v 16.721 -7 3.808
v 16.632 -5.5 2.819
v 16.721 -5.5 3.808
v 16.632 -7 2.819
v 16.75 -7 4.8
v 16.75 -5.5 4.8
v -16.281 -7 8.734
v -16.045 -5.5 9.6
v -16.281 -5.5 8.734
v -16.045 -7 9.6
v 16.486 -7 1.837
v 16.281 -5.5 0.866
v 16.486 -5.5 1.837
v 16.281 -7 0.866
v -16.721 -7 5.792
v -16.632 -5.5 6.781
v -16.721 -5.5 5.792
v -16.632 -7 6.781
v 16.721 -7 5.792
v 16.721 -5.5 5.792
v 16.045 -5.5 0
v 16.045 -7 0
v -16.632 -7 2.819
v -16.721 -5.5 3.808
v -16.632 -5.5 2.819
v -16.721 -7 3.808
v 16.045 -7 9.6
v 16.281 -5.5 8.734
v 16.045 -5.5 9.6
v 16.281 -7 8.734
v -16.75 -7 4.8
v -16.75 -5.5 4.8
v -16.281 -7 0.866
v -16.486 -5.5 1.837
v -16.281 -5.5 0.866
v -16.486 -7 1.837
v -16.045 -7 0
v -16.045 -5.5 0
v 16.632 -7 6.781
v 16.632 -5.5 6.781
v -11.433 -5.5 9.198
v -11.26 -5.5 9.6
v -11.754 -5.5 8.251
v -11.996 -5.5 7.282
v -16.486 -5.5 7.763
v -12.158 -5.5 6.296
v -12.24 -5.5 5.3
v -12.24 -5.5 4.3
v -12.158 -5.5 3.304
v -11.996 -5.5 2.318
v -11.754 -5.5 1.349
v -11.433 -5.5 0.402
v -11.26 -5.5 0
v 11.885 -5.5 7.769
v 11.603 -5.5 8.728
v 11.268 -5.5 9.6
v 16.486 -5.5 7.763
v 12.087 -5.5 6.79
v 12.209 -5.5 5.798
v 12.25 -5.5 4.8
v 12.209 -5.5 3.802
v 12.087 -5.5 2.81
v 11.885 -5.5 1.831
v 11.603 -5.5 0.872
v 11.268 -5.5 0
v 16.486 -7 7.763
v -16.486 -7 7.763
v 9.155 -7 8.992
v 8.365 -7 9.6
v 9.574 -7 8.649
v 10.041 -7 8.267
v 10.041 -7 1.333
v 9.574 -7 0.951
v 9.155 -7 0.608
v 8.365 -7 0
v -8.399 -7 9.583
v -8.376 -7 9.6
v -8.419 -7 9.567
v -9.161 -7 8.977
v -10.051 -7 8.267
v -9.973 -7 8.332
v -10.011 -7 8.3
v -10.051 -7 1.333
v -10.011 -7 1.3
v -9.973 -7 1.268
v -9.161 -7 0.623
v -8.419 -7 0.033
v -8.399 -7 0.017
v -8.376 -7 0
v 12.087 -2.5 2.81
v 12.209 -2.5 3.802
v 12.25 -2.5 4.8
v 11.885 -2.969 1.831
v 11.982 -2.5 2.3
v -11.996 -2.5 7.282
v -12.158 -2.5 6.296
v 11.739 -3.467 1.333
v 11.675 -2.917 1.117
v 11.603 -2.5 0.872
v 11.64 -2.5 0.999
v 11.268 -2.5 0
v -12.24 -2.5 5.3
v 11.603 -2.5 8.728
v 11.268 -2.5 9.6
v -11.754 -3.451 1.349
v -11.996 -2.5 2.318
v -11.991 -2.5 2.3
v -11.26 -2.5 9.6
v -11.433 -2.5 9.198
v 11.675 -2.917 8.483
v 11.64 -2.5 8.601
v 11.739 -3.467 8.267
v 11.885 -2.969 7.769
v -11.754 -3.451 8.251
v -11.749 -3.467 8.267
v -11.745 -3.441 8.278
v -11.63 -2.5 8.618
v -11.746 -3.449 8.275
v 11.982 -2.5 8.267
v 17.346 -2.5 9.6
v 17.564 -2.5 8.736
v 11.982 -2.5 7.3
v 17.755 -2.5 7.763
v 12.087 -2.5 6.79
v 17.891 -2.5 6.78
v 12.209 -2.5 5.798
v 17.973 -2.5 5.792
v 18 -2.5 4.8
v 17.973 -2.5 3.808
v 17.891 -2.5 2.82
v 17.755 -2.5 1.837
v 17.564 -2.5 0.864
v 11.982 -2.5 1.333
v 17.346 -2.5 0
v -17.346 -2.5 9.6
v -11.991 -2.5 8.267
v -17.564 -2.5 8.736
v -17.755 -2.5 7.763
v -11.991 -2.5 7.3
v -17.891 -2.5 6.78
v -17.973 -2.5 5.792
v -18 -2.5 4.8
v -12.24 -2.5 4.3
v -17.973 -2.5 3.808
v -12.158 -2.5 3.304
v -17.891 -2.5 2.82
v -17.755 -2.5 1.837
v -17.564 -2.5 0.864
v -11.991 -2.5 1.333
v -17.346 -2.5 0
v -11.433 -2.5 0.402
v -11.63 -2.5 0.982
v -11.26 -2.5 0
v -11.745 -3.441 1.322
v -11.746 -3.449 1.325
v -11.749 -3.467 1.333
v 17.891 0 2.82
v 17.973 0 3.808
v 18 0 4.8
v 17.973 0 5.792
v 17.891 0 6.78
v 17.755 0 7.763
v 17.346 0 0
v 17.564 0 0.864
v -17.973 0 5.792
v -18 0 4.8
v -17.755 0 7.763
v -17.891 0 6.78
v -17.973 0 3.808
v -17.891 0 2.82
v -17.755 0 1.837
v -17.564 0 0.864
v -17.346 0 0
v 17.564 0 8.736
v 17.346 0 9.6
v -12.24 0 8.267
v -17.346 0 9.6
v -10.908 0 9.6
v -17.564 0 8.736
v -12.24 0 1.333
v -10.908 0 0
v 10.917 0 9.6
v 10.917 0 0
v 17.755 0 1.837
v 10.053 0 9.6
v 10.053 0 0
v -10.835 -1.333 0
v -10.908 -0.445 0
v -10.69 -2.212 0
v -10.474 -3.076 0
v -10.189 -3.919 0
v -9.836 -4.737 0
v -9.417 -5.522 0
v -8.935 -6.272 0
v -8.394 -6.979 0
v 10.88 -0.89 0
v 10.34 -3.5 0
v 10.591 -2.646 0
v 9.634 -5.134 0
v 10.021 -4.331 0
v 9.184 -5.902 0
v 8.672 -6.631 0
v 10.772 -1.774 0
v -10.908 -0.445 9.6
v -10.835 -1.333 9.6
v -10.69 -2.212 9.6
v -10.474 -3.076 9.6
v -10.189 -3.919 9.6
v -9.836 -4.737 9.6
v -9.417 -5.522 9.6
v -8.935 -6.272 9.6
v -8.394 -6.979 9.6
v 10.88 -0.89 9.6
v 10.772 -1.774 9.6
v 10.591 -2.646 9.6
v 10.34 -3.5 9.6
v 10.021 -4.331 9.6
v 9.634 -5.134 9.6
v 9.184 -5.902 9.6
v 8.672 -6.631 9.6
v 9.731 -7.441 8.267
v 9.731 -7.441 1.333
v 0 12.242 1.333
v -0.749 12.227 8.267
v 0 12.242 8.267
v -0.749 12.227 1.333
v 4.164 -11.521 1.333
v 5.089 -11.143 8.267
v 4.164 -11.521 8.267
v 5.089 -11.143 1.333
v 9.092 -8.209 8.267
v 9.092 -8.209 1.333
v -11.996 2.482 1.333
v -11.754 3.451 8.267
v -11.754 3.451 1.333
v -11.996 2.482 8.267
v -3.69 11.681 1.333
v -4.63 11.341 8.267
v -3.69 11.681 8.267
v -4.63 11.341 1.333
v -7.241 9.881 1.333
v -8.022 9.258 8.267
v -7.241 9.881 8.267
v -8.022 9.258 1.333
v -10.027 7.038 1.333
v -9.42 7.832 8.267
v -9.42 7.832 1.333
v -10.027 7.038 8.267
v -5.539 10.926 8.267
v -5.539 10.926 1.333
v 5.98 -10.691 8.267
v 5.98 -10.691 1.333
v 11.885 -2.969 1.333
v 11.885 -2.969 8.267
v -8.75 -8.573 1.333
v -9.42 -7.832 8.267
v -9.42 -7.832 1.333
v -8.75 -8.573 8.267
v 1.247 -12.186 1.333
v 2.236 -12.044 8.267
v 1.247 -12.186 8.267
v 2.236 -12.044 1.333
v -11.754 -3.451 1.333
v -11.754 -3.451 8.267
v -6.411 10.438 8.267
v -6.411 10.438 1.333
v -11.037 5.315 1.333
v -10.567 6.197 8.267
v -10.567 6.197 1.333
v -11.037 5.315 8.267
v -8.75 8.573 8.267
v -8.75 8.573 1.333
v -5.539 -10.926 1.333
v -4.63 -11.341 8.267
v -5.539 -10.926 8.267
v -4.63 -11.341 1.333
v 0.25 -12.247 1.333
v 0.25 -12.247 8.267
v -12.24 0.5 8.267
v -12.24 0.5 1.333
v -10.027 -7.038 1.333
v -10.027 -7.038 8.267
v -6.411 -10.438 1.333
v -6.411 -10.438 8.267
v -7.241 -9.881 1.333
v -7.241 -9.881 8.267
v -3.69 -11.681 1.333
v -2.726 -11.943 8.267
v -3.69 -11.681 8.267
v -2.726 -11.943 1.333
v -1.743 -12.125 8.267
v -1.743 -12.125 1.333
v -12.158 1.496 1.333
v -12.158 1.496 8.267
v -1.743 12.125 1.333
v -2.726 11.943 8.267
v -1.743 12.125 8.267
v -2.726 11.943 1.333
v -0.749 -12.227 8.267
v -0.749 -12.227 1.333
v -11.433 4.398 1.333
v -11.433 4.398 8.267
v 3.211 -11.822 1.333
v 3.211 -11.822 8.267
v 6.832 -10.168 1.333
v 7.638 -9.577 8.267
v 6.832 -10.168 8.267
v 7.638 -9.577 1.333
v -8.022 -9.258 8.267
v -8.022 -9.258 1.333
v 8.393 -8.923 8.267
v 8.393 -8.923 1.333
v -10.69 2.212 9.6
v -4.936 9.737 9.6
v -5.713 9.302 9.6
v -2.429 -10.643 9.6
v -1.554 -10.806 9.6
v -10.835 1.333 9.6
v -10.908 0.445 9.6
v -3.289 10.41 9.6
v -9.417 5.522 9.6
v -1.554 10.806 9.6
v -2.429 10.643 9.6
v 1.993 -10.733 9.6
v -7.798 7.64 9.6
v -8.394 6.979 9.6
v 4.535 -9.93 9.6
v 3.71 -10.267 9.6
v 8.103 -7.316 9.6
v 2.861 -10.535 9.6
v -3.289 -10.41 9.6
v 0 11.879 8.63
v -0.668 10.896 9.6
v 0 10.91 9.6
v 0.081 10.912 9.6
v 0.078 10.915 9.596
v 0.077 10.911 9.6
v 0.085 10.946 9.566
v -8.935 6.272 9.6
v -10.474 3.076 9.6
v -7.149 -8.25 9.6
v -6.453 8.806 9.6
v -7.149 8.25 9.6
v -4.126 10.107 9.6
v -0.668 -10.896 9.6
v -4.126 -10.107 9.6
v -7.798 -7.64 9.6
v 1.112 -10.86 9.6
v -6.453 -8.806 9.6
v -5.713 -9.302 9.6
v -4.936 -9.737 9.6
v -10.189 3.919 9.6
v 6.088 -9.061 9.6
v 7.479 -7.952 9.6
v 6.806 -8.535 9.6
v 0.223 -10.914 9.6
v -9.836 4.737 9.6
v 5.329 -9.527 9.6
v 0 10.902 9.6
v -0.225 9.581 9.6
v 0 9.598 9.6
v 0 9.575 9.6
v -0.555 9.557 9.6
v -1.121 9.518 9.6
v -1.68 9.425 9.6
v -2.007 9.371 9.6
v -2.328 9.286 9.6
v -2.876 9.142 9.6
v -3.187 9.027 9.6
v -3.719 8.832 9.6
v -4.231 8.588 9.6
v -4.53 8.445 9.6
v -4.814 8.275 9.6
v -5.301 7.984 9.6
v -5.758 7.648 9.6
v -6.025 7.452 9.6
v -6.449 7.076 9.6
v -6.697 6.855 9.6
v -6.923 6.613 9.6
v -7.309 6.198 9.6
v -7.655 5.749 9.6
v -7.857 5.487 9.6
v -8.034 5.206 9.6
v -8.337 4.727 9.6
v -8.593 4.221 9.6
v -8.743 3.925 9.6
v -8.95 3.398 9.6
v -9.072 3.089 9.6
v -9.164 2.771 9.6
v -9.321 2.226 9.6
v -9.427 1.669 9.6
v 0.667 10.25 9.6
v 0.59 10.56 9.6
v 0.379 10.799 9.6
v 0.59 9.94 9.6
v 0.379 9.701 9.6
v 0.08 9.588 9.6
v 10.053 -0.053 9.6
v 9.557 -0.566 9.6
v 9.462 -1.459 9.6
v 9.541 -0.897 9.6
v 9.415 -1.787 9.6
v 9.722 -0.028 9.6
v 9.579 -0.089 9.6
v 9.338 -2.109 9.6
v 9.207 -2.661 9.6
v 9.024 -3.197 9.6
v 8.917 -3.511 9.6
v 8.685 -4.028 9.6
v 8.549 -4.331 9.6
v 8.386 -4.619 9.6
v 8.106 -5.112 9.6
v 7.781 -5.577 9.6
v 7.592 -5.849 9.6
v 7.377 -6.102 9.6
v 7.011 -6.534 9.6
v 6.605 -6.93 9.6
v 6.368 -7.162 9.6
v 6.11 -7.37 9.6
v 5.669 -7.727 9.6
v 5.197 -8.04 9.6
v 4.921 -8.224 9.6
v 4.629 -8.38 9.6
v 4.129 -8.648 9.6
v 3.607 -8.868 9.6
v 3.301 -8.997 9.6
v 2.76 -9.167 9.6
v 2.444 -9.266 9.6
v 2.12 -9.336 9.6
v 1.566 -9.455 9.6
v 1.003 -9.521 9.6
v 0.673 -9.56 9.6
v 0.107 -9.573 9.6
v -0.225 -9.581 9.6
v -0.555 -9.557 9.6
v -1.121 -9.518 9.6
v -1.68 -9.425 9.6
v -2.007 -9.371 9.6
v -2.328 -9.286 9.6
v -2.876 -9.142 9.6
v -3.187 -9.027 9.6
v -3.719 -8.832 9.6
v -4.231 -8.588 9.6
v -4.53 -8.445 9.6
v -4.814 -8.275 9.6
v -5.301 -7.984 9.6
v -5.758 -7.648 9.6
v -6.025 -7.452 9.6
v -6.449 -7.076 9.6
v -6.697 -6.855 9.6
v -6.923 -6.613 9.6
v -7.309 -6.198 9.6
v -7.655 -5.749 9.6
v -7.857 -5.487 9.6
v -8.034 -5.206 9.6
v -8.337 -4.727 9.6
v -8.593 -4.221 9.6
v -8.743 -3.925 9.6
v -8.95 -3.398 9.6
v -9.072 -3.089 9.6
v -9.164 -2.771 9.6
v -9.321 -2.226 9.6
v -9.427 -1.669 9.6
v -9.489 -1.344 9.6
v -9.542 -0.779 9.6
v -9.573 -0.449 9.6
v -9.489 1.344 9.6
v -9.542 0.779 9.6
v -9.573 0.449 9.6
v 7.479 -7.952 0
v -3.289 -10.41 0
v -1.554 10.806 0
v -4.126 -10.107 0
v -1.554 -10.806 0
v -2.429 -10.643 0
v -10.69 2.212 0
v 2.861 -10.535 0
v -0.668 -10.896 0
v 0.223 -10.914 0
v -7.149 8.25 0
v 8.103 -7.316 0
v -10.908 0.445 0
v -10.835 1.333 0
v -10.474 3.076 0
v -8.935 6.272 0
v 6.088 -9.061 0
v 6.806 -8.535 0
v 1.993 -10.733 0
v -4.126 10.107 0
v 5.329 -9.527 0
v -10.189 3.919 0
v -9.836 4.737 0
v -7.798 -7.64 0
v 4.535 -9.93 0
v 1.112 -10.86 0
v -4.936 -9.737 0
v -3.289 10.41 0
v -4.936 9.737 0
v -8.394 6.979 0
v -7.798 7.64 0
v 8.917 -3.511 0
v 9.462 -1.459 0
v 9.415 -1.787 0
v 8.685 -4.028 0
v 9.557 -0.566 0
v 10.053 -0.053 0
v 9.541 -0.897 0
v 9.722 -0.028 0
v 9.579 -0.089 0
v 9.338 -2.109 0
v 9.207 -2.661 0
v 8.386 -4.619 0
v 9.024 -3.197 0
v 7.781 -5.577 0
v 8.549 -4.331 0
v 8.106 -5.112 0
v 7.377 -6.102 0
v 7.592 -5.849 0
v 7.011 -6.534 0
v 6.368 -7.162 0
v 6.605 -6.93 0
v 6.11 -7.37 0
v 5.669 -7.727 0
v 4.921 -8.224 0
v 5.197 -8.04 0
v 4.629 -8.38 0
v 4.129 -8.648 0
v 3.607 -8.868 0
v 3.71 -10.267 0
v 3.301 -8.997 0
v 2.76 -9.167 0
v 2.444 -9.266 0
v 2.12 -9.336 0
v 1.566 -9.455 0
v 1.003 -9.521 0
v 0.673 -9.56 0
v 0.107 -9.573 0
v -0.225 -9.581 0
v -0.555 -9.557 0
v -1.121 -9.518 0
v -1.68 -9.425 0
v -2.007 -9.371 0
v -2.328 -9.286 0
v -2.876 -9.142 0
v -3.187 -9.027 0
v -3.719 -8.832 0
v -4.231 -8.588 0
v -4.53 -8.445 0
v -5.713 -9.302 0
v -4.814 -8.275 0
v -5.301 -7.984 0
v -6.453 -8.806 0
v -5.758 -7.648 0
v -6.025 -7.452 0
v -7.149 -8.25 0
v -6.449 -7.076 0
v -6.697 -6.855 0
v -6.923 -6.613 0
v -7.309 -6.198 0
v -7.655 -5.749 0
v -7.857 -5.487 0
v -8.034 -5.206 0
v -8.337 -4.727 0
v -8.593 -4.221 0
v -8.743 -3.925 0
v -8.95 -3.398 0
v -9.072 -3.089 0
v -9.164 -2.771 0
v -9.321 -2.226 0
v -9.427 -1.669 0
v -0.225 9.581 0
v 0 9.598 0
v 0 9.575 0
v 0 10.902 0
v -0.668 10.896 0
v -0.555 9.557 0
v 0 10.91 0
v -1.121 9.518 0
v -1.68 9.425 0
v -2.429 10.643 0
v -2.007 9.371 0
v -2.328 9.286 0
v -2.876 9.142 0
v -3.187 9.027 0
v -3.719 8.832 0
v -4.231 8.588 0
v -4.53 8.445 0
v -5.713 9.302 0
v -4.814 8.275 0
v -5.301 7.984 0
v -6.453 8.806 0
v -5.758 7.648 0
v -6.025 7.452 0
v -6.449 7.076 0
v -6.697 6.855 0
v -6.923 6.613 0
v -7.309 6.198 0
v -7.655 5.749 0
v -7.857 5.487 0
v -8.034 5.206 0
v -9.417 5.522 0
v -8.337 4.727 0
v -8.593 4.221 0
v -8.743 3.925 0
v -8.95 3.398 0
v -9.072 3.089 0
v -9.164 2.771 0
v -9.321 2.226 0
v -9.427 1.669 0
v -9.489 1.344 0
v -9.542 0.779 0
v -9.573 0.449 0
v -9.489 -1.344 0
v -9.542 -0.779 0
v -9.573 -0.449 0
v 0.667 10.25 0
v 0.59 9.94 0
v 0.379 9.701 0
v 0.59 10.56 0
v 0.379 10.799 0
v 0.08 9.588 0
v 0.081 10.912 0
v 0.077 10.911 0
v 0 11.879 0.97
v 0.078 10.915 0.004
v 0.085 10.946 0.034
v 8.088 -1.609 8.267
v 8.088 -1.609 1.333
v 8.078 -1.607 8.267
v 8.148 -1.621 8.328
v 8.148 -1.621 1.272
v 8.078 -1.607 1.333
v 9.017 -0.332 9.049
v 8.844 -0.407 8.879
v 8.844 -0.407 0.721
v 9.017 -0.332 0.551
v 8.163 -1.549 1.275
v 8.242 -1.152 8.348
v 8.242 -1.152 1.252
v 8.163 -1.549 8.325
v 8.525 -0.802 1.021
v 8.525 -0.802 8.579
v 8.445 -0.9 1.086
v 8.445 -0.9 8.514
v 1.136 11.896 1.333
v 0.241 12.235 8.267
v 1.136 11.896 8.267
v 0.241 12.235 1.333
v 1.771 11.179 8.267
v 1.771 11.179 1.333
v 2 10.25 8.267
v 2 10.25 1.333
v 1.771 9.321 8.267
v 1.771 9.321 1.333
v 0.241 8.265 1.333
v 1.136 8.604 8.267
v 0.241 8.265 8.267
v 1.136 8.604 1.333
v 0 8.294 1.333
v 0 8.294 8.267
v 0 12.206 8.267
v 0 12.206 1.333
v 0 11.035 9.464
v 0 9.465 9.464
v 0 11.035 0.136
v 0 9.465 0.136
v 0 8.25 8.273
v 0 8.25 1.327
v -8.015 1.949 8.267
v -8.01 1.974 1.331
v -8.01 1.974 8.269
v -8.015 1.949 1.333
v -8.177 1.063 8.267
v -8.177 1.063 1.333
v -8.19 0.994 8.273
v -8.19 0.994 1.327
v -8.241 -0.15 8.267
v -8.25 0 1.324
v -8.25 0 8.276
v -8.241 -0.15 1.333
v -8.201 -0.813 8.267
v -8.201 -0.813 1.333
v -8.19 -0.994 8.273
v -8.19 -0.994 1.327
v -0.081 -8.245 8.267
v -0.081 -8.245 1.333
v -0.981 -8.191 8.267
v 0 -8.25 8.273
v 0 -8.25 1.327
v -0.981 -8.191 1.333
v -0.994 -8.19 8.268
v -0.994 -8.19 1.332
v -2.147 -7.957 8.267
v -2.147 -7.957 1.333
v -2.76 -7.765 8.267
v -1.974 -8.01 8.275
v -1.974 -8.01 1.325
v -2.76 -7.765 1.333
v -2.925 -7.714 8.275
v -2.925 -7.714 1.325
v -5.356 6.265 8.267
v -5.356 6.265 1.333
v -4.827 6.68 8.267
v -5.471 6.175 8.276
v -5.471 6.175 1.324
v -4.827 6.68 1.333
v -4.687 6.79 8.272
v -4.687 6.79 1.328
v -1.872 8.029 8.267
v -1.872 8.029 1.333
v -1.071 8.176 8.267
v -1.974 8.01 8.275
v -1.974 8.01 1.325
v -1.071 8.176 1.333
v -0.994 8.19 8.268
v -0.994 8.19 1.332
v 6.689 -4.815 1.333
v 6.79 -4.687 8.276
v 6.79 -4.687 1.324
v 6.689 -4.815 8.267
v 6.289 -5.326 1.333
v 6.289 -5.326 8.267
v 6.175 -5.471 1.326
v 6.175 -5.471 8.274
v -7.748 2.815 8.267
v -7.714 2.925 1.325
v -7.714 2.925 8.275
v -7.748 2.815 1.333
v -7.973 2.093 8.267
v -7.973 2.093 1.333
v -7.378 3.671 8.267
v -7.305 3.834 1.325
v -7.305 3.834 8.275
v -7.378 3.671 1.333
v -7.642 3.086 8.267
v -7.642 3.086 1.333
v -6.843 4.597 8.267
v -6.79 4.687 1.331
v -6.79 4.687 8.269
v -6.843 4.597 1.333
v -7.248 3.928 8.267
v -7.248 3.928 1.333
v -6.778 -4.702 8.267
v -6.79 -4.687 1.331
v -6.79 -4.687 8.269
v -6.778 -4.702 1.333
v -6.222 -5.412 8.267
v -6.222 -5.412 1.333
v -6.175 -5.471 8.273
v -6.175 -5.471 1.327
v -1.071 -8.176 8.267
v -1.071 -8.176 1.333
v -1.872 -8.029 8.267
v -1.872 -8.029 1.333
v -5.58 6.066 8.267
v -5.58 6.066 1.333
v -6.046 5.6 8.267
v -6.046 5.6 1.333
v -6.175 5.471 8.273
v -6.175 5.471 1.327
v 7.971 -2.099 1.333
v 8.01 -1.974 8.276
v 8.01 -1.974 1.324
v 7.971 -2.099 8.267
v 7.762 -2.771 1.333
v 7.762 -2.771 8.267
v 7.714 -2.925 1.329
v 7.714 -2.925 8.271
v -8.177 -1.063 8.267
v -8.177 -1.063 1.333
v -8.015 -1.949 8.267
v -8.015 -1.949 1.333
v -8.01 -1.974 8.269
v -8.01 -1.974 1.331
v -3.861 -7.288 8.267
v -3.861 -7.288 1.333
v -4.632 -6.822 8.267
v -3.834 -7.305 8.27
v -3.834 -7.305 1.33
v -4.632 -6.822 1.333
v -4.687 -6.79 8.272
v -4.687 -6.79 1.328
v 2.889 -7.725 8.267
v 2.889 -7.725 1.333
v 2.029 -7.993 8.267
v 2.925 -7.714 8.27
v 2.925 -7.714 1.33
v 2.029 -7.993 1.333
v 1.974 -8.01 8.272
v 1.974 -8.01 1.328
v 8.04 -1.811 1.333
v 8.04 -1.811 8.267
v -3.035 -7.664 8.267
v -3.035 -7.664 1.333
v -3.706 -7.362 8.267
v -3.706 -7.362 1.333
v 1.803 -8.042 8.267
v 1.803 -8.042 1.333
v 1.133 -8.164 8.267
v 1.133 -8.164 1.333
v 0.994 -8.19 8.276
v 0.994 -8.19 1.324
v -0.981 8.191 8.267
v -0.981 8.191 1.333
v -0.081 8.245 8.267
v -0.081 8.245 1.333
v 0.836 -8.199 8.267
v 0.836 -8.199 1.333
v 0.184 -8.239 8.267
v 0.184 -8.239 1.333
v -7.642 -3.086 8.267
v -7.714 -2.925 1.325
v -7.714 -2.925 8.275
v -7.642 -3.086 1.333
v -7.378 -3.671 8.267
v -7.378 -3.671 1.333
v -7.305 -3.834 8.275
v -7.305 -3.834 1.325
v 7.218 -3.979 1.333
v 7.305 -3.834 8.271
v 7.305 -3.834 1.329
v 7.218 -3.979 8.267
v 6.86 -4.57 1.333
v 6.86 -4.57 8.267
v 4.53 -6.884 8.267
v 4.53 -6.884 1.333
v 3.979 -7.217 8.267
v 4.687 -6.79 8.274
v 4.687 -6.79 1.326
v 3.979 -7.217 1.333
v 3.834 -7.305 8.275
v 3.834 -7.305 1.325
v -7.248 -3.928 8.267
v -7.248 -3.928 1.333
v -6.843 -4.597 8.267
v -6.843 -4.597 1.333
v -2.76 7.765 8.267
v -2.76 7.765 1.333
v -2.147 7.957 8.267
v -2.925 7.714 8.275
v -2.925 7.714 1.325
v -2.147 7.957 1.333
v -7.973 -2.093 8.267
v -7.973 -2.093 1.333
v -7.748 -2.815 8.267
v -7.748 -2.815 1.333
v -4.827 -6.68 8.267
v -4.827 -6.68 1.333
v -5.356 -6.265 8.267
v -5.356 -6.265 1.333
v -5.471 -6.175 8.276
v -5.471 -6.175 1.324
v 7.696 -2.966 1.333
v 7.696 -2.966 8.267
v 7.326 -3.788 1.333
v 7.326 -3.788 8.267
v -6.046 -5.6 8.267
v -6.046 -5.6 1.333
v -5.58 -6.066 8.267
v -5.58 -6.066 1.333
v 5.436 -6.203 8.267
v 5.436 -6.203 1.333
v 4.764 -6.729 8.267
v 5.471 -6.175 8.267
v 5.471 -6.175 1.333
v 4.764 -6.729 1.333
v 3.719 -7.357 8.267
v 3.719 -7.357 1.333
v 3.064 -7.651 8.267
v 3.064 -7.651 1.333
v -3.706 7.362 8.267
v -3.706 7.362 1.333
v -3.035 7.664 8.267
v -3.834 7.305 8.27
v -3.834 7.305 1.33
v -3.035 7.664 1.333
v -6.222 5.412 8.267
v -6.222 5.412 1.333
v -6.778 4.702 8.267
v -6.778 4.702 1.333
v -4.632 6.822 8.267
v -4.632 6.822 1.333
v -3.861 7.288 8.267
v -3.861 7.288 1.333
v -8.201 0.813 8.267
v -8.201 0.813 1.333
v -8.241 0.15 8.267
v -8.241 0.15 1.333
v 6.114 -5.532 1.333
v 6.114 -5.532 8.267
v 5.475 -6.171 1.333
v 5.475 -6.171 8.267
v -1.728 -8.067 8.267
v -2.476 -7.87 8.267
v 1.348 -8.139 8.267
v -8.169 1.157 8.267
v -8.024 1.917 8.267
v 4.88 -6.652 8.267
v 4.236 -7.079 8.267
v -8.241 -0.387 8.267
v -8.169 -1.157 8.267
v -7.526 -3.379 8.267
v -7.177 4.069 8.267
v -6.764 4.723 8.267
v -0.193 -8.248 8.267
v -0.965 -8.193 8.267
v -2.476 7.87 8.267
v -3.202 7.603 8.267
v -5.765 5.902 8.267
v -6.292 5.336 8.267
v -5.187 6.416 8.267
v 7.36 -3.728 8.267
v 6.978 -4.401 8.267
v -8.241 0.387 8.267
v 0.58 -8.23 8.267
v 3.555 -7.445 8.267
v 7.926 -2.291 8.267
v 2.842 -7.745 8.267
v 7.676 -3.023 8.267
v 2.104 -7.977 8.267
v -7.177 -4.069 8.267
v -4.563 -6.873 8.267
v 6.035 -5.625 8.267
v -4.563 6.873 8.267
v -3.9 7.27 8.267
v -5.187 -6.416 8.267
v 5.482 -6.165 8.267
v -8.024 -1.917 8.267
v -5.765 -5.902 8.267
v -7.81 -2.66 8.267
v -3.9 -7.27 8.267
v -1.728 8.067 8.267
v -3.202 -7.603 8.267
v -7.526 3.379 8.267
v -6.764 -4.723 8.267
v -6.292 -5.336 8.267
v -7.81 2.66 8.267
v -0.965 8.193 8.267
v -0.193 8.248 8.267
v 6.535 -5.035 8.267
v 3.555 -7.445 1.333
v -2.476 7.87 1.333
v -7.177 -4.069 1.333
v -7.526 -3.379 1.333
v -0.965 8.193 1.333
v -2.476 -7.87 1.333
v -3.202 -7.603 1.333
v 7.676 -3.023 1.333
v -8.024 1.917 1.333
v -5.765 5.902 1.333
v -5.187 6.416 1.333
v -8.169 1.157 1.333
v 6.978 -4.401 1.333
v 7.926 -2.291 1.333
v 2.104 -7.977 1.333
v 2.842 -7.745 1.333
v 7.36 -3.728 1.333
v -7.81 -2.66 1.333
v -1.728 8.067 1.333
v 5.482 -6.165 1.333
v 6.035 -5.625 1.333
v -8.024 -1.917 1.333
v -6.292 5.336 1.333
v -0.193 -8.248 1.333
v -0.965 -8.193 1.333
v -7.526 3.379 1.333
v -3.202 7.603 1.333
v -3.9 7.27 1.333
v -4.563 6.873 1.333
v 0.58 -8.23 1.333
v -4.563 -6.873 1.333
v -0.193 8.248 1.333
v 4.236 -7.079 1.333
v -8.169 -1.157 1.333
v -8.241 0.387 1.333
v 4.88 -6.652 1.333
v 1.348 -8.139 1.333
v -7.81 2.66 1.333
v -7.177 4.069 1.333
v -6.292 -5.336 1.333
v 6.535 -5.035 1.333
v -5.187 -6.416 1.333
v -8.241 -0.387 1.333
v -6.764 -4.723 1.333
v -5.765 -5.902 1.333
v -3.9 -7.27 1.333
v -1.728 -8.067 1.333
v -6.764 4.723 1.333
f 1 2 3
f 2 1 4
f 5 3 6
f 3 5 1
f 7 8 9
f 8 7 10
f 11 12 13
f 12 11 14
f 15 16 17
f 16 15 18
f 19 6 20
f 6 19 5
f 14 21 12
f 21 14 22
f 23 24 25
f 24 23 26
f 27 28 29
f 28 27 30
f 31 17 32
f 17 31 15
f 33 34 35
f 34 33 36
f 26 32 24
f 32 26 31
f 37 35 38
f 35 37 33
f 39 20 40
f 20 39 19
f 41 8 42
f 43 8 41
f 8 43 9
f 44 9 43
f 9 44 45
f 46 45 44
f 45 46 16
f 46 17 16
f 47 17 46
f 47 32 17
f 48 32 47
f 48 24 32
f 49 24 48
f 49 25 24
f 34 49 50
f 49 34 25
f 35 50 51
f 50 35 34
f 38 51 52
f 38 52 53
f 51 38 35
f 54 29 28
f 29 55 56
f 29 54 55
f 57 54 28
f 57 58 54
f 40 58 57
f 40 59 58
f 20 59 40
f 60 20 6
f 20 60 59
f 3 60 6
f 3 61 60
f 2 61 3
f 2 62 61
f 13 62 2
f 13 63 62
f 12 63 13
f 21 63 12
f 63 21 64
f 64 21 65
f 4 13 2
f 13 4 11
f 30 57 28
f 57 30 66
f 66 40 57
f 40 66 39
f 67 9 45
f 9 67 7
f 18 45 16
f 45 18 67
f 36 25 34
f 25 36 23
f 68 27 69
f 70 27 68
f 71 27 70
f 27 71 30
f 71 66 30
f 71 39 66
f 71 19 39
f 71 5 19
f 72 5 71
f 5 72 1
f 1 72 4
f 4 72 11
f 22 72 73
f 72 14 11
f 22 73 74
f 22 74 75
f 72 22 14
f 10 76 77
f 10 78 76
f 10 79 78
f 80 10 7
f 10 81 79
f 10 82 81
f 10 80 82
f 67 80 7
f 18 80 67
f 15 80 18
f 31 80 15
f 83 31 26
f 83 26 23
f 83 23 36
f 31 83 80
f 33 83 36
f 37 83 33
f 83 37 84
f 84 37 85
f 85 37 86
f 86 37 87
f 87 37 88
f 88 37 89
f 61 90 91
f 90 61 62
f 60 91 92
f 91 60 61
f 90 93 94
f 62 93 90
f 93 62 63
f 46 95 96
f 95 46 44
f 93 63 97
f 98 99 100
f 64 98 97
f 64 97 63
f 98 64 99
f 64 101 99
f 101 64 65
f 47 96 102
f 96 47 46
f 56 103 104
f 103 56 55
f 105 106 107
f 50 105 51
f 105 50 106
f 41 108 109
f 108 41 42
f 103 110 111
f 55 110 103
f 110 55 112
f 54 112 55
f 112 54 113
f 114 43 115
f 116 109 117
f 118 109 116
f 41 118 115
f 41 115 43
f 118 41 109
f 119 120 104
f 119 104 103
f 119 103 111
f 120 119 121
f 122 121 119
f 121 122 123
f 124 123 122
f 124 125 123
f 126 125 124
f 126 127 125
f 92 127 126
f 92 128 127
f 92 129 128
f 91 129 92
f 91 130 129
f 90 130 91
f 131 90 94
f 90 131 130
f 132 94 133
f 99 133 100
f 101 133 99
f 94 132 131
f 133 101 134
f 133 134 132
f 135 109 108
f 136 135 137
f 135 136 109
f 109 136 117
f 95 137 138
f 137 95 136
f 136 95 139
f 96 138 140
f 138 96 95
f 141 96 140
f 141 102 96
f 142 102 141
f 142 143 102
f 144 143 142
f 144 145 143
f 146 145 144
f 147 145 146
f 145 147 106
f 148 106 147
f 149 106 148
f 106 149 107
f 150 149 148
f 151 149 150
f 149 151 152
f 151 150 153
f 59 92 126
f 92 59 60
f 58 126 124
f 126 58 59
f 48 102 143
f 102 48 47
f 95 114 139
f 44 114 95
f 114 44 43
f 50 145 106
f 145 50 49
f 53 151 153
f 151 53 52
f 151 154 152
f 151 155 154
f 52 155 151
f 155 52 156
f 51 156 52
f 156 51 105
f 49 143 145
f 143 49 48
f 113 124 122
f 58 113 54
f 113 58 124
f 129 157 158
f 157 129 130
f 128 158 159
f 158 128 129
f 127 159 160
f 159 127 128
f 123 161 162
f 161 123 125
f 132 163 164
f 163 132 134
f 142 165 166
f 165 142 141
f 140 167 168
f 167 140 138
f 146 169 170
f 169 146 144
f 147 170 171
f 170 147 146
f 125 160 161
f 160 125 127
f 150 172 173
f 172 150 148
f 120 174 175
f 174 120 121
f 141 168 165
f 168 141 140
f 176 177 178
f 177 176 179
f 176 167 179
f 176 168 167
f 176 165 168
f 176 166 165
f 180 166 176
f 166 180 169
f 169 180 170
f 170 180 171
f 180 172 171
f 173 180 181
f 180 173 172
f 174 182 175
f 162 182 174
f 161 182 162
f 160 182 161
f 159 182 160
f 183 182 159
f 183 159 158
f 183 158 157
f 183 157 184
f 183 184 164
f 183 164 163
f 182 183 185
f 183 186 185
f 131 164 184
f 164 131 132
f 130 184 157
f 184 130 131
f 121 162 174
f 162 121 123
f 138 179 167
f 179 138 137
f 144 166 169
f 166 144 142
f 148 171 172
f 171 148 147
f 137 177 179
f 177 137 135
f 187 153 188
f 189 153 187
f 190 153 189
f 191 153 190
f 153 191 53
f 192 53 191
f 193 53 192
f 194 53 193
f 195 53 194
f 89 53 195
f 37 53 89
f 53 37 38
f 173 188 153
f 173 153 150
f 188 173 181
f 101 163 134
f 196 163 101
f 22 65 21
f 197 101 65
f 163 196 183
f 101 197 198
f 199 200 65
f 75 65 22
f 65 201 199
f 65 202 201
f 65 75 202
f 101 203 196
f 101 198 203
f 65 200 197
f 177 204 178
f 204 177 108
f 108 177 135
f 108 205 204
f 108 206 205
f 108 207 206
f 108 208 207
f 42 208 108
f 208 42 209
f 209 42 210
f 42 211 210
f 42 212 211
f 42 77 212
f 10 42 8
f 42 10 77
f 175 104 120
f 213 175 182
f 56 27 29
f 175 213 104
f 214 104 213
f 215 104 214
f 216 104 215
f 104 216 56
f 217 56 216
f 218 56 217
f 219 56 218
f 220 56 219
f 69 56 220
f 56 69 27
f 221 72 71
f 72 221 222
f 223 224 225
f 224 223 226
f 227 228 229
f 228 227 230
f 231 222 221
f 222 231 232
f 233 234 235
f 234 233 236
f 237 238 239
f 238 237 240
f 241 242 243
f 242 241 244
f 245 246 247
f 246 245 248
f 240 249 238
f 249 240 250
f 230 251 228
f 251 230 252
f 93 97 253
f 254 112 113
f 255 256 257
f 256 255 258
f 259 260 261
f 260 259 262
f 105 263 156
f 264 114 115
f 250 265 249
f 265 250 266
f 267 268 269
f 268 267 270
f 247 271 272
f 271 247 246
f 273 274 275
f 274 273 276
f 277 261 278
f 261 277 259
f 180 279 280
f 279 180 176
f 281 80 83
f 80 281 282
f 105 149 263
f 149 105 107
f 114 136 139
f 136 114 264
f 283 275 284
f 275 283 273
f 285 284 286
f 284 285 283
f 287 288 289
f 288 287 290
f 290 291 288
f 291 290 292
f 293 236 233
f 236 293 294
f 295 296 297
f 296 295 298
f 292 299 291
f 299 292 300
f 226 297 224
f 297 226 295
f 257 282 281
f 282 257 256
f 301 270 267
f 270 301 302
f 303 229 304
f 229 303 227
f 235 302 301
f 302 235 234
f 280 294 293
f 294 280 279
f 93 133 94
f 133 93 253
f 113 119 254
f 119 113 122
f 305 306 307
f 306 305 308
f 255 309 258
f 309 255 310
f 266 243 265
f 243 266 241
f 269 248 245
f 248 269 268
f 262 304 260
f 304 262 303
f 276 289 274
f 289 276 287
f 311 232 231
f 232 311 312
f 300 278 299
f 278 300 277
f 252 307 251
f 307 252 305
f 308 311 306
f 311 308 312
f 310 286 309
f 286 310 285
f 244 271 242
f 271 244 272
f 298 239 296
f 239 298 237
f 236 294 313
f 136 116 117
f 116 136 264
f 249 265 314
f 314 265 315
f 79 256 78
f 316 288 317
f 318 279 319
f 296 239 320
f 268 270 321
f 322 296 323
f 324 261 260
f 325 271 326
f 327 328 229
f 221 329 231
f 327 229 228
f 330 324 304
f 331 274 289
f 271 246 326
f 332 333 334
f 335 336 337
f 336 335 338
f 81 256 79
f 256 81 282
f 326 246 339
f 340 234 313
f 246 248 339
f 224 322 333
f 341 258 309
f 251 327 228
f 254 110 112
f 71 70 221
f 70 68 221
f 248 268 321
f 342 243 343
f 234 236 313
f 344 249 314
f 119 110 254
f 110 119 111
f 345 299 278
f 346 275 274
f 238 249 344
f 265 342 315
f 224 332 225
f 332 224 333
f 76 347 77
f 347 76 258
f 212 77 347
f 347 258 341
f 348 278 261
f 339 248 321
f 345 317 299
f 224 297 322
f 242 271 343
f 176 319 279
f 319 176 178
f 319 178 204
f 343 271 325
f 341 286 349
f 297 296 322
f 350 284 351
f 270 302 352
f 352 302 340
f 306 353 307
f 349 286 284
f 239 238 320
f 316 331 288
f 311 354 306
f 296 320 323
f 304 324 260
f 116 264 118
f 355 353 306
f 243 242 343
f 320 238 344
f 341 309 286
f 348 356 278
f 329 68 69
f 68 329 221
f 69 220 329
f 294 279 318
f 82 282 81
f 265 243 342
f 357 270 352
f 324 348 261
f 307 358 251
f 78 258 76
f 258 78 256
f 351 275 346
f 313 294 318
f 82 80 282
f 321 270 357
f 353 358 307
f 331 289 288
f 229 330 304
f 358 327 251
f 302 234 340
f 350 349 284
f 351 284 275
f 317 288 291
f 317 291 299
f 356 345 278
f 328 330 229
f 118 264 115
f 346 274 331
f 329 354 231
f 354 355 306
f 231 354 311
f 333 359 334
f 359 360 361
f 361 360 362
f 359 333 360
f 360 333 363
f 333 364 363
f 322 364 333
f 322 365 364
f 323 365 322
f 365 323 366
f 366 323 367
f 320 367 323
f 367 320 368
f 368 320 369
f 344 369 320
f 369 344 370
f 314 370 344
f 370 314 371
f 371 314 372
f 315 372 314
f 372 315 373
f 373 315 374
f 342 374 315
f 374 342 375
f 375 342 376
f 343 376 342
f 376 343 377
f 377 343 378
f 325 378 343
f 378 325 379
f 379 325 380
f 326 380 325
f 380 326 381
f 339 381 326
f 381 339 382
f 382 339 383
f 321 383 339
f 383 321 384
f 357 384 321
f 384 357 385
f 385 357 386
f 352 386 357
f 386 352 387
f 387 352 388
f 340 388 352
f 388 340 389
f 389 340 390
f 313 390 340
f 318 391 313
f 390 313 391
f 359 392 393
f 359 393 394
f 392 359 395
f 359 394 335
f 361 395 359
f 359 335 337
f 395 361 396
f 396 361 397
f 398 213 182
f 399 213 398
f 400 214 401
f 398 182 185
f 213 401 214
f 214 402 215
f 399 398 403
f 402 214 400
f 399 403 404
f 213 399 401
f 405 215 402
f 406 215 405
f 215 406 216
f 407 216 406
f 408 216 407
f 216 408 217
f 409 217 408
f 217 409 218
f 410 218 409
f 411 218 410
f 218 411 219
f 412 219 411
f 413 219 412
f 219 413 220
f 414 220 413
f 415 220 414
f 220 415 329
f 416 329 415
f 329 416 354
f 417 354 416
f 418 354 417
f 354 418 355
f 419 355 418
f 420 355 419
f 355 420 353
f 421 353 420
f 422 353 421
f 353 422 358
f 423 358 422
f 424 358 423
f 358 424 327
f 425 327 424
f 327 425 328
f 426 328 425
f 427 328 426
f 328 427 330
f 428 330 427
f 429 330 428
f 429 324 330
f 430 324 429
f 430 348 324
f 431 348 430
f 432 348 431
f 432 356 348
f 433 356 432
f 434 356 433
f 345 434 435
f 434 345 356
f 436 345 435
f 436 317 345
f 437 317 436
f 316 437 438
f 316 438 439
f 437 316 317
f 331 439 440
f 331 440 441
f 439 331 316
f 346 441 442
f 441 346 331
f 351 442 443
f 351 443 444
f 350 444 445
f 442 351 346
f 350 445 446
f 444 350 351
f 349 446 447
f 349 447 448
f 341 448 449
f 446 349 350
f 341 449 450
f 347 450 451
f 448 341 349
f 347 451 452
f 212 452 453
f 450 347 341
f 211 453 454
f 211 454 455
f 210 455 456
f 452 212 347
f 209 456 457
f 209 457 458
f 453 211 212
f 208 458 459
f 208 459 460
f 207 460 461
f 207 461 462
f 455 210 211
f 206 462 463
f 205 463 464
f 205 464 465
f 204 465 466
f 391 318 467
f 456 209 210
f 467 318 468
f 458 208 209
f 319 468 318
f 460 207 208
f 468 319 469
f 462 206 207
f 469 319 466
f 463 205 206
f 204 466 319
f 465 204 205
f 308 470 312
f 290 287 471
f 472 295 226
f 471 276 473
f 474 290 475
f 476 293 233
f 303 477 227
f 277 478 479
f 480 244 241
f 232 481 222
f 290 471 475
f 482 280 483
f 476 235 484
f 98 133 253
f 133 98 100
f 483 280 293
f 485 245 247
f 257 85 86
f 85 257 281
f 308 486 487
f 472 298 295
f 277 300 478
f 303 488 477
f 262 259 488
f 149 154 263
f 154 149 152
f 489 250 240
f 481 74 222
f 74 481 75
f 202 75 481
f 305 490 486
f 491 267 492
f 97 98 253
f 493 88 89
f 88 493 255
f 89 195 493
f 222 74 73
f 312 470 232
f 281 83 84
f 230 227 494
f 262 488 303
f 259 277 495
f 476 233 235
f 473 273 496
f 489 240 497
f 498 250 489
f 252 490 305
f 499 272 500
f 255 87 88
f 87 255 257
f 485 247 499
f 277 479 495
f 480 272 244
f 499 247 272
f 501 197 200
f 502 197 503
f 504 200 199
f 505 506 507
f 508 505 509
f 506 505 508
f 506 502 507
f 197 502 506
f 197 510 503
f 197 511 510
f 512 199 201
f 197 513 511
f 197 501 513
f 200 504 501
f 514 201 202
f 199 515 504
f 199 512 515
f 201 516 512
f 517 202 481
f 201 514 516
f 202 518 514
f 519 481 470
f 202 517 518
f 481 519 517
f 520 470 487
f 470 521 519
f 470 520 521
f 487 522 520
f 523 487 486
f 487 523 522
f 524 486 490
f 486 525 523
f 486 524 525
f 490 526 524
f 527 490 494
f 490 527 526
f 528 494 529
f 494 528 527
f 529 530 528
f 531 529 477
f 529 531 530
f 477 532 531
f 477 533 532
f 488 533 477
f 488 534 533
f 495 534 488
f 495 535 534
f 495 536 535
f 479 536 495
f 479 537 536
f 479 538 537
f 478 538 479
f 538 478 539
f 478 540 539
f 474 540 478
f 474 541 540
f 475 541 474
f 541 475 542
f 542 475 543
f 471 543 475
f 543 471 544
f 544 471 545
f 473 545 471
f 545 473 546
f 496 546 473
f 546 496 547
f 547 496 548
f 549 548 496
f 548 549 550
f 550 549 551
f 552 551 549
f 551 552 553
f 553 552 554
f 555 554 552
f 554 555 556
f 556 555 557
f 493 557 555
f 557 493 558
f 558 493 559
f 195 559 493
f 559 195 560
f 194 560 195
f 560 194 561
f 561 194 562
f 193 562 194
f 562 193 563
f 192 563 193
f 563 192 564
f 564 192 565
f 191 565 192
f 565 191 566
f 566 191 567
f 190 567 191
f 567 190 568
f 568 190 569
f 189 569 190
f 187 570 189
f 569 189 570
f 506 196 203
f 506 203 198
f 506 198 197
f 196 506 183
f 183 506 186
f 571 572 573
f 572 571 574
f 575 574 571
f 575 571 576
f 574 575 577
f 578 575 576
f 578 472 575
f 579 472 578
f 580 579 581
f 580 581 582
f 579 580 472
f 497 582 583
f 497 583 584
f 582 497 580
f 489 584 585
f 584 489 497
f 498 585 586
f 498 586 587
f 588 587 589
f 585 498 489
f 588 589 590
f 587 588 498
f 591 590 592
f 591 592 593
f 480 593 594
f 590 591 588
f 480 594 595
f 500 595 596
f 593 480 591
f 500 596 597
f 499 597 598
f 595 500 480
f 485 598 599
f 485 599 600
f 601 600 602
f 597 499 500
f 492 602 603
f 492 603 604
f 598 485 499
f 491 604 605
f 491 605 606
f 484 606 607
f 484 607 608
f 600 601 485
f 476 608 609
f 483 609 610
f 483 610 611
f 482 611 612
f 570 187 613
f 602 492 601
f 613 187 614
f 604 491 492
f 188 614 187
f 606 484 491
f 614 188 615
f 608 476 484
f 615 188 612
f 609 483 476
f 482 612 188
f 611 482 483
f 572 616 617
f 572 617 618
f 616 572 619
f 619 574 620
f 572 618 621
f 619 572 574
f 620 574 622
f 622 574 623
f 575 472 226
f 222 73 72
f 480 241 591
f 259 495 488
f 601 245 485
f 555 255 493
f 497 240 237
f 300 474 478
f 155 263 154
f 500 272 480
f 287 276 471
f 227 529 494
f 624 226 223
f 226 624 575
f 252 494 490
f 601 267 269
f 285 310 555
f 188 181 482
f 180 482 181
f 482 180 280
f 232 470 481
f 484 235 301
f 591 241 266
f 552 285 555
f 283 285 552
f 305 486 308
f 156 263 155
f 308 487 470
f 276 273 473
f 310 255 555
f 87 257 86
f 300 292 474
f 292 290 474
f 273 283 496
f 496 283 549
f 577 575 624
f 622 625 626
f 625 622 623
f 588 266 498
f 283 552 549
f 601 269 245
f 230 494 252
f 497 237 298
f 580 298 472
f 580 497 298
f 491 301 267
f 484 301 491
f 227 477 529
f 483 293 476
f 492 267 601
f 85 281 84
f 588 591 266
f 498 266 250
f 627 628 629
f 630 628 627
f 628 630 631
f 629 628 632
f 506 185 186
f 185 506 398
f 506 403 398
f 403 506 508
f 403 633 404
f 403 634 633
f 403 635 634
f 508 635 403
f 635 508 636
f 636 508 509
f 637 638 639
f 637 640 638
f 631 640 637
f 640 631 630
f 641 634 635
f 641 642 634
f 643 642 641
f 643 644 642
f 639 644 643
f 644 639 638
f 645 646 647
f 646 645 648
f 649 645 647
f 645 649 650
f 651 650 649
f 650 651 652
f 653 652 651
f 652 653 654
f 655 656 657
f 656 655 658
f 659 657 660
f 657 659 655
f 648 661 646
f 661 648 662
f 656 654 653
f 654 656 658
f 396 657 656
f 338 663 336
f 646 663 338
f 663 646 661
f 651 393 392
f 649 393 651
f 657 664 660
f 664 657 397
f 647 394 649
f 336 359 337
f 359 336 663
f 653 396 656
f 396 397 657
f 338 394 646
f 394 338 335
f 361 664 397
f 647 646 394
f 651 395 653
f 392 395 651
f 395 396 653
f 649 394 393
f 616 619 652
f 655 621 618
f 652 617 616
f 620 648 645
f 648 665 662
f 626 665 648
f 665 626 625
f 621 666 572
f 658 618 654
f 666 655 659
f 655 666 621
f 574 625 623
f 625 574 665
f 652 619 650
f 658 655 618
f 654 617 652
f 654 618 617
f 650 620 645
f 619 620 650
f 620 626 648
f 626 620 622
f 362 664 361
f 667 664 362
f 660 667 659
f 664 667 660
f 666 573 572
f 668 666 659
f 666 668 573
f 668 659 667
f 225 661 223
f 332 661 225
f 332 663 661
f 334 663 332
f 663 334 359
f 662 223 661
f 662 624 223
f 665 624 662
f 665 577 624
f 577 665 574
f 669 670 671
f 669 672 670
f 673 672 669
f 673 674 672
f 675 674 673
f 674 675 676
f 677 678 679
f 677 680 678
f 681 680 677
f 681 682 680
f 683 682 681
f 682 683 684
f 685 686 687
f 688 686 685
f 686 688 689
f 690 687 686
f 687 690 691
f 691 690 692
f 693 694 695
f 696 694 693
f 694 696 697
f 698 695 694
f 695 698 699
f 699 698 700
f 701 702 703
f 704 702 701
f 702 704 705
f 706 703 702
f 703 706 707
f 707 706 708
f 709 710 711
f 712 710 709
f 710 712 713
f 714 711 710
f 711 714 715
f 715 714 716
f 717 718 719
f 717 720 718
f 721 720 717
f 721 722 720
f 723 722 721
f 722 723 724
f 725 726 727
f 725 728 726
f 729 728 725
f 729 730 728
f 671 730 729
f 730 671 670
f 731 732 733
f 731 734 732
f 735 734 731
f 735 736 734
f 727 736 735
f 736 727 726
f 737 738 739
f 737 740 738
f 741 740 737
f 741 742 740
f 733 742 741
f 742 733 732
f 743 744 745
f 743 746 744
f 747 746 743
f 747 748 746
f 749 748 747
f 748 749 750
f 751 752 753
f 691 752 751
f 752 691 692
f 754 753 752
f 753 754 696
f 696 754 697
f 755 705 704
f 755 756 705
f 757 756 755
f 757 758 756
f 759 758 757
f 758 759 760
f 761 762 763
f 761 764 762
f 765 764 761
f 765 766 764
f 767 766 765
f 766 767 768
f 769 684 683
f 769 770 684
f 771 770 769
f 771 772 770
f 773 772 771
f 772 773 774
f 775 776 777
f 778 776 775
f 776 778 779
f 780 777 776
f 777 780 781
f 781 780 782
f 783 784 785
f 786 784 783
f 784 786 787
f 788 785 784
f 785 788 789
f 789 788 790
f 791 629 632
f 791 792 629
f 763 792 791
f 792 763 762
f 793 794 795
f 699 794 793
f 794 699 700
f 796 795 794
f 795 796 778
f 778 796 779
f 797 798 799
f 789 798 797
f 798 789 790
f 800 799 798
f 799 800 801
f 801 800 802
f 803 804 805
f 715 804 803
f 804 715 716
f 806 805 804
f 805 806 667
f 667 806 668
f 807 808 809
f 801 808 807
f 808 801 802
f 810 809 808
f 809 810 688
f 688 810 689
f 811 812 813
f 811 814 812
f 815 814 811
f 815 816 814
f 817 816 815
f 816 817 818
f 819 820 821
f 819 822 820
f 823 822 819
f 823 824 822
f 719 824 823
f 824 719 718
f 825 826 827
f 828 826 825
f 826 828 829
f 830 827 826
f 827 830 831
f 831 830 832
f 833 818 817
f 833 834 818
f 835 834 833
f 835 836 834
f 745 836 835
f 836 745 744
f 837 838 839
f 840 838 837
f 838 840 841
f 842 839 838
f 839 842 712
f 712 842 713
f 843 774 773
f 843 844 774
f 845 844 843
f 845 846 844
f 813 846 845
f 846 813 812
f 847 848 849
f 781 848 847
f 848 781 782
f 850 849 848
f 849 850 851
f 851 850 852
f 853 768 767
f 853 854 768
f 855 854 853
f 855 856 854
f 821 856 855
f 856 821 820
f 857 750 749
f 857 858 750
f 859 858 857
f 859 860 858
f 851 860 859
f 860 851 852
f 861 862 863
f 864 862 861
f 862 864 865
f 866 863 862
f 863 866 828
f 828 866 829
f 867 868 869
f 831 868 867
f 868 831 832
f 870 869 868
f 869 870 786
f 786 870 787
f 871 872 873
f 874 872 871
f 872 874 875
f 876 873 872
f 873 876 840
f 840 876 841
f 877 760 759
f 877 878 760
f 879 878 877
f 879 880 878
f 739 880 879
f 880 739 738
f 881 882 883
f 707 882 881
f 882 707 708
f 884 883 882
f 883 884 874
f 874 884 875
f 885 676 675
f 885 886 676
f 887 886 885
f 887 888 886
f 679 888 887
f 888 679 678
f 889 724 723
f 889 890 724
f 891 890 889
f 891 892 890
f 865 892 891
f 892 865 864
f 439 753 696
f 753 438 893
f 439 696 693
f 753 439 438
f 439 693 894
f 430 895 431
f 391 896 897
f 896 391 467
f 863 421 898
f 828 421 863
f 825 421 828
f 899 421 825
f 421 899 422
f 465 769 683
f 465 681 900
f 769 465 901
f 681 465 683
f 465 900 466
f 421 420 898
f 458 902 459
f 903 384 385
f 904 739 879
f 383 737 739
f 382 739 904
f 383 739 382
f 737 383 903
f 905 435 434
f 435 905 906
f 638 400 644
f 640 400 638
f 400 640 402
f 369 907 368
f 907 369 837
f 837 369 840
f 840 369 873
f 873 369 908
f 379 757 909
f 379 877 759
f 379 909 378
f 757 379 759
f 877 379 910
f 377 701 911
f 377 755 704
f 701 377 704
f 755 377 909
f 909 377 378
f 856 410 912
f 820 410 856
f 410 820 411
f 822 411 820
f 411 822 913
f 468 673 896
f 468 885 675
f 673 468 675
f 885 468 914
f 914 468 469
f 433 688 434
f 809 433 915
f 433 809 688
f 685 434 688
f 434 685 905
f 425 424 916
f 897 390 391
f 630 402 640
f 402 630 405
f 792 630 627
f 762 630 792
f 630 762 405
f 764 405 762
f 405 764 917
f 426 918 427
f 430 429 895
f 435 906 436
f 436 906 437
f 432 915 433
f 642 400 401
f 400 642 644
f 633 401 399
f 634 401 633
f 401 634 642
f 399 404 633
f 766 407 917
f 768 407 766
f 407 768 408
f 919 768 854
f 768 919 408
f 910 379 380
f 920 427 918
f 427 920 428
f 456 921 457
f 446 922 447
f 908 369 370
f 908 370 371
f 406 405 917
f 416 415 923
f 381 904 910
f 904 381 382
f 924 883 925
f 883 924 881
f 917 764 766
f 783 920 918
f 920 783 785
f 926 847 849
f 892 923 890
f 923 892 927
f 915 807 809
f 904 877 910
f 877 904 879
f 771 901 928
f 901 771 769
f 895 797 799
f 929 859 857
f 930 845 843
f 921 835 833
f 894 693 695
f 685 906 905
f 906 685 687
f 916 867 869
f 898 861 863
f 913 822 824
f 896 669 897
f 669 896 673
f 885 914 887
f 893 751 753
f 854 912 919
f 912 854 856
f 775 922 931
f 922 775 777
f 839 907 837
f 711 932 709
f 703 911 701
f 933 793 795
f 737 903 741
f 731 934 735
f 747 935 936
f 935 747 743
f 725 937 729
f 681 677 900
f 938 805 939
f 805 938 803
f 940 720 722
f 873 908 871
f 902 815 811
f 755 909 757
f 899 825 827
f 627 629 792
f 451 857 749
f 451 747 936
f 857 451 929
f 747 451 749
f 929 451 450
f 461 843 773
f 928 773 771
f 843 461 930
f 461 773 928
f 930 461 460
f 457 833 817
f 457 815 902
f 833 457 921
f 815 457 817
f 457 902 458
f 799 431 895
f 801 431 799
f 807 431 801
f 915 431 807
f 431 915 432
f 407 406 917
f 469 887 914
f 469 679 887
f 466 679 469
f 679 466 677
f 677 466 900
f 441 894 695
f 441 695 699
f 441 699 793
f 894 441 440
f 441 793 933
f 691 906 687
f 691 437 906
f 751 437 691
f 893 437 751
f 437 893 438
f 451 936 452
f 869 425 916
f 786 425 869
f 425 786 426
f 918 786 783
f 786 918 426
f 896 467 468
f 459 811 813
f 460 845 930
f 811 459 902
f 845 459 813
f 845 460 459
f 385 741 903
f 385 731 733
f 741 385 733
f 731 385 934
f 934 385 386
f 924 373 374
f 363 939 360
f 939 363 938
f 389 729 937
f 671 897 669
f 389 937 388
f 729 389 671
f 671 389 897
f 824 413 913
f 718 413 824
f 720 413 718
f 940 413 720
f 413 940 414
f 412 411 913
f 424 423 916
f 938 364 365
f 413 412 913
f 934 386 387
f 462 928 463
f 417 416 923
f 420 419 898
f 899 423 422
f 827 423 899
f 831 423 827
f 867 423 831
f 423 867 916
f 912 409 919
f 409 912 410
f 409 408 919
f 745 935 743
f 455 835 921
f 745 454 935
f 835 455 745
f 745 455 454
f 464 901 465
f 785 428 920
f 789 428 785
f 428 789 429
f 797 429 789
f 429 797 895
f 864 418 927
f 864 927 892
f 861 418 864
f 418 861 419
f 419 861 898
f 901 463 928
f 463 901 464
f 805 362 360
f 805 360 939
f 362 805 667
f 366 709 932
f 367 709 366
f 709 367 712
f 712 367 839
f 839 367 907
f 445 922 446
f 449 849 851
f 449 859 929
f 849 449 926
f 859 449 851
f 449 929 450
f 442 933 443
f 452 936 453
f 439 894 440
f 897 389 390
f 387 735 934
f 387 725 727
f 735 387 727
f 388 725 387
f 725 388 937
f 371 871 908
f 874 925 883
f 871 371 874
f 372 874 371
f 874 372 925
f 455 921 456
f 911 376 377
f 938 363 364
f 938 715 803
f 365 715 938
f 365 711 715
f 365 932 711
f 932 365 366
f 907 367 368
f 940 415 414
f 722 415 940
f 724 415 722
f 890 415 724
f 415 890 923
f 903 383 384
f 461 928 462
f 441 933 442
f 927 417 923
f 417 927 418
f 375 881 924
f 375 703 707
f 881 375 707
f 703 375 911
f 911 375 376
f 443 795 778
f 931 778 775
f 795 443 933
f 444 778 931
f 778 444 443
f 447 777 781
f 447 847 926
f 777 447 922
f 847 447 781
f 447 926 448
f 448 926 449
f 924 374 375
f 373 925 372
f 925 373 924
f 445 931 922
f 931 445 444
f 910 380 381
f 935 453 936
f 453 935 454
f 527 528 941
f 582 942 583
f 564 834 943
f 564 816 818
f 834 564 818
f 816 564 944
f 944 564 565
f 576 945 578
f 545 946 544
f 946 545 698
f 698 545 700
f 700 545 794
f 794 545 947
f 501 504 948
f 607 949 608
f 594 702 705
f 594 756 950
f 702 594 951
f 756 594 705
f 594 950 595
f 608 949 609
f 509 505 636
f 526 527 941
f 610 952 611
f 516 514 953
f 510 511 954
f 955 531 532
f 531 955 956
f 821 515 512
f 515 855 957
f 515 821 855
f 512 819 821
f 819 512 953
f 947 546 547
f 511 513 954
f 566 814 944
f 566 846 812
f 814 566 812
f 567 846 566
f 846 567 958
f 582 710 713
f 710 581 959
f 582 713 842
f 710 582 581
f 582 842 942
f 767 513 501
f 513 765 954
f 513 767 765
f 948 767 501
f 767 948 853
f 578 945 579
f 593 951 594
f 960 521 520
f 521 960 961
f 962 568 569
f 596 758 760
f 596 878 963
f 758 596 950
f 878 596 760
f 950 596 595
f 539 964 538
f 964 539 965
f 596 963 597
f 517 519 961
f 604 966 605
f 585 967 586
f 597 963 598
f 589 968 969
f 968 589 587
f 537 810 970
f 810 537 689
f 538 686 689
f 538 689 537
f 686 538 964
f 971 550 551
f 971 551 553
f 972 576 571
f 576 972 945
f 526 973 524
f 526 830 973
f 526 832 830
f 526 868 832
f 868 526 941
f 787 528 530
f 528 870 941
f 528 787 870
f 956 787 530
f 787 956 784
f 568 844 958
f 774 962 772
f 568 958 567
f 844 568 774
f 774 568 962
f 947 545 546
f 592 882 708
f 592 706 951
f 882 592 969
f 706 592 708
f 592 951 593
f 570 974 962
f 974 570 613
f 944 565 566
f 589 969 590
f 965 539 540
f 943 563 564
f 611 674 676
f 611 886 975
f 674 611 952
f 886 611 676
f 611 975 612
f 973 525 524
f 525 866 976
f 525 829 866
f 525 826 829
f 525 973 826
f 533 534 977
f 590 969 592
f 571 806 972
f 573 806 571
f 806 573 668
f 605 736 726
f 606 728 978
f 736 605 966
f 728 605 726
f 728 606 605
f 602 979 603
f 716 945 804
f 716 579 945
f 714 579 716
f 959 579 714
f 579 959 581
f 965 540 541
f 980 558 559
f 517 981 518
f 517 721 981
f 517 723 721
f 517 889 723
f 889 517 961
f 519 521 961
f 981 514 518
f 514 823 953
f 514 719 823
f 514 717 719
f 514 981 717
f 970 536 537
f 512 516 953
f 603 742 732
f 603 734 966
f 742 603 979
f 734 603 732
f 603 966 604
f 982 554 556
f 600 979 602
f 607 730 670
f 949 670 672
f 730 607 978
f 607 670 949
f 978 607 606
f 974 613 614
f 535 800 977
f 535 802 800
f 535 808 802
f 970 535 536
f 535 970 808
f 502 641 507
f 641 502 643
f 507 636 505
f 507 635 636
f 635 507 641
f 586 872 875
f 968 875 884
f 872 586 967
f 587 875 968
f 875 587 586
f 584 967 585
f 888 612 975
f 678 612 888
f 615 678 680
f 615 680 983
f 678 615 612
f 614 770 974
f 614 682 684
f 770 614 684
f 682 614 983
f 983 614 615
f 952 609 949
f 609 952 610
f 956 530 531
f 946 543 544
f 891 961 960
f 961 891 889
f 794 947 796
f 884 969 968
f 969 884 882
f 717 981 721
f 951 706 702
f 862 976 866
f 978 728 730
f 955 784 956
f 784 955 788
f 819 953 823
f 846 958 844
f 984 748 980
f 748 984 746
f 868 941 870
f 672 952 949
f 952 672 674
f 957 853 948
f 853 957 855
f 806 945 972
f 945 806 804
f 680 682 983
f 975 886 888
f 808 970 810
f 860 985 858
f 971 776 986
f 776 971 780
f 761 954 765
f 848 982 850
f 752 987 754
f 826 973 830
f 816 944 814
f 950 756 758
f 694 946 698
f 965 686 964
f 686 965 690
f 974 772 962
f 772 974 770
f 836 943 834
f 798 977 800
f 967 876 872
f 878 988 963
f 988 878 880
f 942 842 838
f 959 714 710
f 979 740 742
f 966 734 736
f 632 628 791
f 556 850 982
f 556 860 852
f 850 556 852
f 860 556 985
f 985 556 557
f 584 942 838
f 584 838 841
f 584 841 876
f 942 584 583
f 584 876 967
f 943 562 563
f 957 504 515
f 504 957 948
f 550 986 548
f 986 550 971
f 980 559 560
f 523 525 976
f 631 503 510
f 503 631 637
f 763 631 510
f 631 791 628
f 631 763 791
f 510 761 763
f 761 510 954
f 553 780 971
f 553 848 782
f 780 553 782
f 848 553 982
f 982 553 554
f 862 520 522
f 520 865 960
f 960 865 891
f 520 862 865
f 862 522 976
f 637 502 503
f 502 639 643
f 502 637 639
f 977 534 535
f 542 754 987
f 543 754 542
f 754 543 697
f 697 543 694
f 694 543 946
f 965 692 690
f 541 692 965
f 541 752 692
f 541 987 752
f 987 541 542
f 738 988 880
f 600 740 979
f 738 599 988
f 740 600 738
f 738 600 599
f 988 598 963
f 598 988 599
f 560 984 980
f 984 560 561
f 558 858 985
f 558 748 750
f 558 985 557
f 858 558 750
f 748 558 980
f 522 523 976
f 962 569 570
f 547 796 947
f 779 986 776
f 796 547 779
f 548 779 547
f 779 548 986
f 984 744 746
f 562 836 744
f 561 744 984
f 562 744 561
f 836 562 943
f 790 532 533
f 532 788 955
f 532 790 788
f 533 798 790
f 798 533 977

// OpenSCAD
Tab_Thickness = 1.5; // 0.01
Tab_Width = 9.6; // 0.01
Tab_Outer_Diameter = 33.5; // 0.01
Socket_Inner_Diameter = 24.5; // 0.01
Socket_Inner_Radius = Socket_Inner_Diameter / 2;
Socket_Inner_Depth = 3.0; // 0.01
Flange_Thickness = 2.5; // 0.01
Flange_Outer_Diameter = 36.0; // 0.01
Flange_Inner_Diameter = 19.5; // 0.01
Hook_Thickness = 4.0; // 0.01
Hook_Chamfer = Hook_Thickness/3;
Total_Height = Tab_Thickness+Socket_Inner_Depth+Flange_Thickness;
Part = "Hook"; // [Tabs, Hook, Pin]

$fa = $preview ? 15 : 2;
$fs = $preview ? 1.25 : 1;

if (Part == "Tabs") {
	tab_socket();
}
if (Part == "Hook") {
	difference() {
		union() {
			tab_socket();
			hook_positive();
		}
		hook_negative();
	}
}
if (Part == "Pin") {
}

module body() {
	// Tabs
	cylinder(d=Tab_Outer_Diameter, h=Tab_Thickness);

	// Socket
	cylinder(d=Socket_Inner_Diameter, h=Socket_Inner_Depth+Tab_Thickness);

	// Flange
	translate([0, 0, Socket_Inner_Depth+Tab_Thickness])
		cylinder(d=Flange_Outer_Diameter, h=Flange_Thickness);
}

module tab_socket() {
	translate([0, -Total_Height, Tab_Width/2])
		rotate(-90, [1,0,0])
			difference() {
				body();

				// Top
				translate([0, Flange_Outer_Diameter/2+Tab_Width/2, -1])
					cube(Flange_Outer_Diameter, center=true);

				// Bottom
				translate([0, -Flange_Outer_Diameter/2-Tab_Width/2, -1])
					cube(Flange_Outer_Diameter, center=true);
			}
}

module hook_positive() {
	// Outside
	translate([0, 0, Hook_Chamfer])
		cylinder(d=Socket_Inner_Diameter, h=Tab_Width-Hook_Chamfer*2);

	// Top chamfer
	translate([0, 0, Tab_Width-Hook_Chamfer])
		cylinder(
			d1=Socket_Inner_Diameter,
			d2=Socket_Inner_Diameter-Hook_Chamfer*2,
			h=Hook_Chamfer
		);

	// Bottom chamfer
	cylinder(
		d1=Socket_Inner_Diameter-Hook_Chamfer*2,
		d2=Socket_Inner_Diameter,
		h=Hook_Chamfer
	);
}

module hook_tip() {
	// Main round
	translate([0, 0, Hook_Chamfer])
		cylinder(d=Hook_Thickness, h=Tab_Width-Hook_Chamfer*2);

	// Top round chamfer
	translate([0, 0, Tab_Width-Hook_Chamfer])
		cylinder(
			d1=Hook_Thickness,
			d2=Hook_Thickness-Hook_Chamfer*2,
			h=Hook_Chamfer
		);

	// Bottom round chamfer
	cylinder(
		d1=Hook_Thickness-Hook_Chamfer*2,
		d2=Hook_Thickness,
		h=Hook_Chamfer
	);
}

module hook_negative() {
	// Center
	translate([0, 0, -1])
		cylinder(
			d=Socket_Inner_Diameter-Hook_Thickness*2,
			h=Tab_Width+2
		);

	// Top chamfer
	translate([0, 0, Tab_Width-Hook_Chamfer])
		cylinder(
			d1=Socket_Inner_Diameter-Hook_Thickness*2,
			d2=Socket_Inner_Diameter-Hook_Thickness*2+Hook_Chamfer*2+2,
			h=Hook_Chamfer+1
		);

	// Bottom chamfer
	translate([0, 0, -1])
		cylinder(
			d1=Socket_Inner_Diameter-Hook_Thickness*2+Hook_Chamfer*2+2,
			d2=Socket_Inner_Diameter-Hook_Thickness*2,
			h=Hook_Chamfer+1
		);

	r = Socket_Inner_Radius-Hook_Thickness/2;
	a = asin((Hook_Thickness/2) / r);
	rotate(-a, [0,0,1])
		translate([r, 0, 0]) {
			difference() {
				rotate(90, [0,0,1])
					difference() {
						cube([Hook_Thickness, Hook_Thickness, Tab_Width]);
						rotate(a-90, [0,0,1])
							cube([Hook_Thickness, Hook_Thickness, Tab_Width]);
					}
				cylinder(d=Hook_Thickness, h=Tab_Width);
			}
		}

	// Cutout
	difference() {
		// Corner
		translate([0, 0, -1])
			cube(Socket_Inner_Diameter);

		// Rounded hook tip
		translate([0, Socket_Inner_Radius-Hook_Thickness/2, 0])
			hook_tip();
	}
}
